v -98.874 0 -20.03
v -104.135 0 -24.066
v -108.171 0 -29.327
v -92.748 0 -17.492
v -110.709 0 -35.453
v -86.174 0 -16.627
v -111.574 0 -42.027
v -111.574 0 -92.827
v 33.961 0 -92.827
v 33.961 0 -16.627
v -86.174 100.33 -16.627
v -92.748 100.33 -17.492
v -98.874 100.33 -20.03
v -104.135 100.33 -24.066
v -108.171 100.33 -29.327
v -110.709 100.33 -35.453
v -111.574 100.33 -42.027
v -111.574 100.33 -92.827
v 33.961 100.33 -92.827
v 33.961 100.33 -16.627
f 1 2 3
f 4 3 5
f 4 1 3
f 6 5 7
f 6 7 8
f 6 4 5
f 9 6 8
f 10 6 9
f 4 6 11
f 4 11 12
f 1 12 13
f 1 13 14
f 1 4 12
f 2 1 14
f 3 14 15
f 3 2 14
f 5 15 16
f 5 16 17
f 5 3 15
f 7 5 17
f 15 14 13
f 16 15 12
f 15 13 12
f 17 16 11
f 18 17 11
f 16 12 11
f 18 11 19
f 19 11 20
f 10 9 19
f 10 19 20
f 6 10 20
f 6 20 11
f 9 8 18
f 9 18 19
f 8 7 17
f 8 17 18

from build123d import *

# Parameters (mm, degrees)
F1_DEPTH = 100.33


with BuildPart() as f1:
    # F0 (on Front) → F1 (new body)
    with BuildSketch(Plane.XZ):
        with BuildLine():
            Line((33.960865, -16.626953), (-86.174272, -16.626953))
            ThreePointArc((-86.174272, -16.626953), (-104.134784, -24.066441), (-111.574272, -42.026953))
            Line((-111.574272, -42.026953), (-111.574272, -92.826953))
            Line((-111.574272, -92.826953), (33.960865, -92.826953))
            Line((33.960865, -92.826953), (33.960865, -16.626953))
        make_face()
    extrude(amount=-F1_DEPTH)


solid = f1.part
